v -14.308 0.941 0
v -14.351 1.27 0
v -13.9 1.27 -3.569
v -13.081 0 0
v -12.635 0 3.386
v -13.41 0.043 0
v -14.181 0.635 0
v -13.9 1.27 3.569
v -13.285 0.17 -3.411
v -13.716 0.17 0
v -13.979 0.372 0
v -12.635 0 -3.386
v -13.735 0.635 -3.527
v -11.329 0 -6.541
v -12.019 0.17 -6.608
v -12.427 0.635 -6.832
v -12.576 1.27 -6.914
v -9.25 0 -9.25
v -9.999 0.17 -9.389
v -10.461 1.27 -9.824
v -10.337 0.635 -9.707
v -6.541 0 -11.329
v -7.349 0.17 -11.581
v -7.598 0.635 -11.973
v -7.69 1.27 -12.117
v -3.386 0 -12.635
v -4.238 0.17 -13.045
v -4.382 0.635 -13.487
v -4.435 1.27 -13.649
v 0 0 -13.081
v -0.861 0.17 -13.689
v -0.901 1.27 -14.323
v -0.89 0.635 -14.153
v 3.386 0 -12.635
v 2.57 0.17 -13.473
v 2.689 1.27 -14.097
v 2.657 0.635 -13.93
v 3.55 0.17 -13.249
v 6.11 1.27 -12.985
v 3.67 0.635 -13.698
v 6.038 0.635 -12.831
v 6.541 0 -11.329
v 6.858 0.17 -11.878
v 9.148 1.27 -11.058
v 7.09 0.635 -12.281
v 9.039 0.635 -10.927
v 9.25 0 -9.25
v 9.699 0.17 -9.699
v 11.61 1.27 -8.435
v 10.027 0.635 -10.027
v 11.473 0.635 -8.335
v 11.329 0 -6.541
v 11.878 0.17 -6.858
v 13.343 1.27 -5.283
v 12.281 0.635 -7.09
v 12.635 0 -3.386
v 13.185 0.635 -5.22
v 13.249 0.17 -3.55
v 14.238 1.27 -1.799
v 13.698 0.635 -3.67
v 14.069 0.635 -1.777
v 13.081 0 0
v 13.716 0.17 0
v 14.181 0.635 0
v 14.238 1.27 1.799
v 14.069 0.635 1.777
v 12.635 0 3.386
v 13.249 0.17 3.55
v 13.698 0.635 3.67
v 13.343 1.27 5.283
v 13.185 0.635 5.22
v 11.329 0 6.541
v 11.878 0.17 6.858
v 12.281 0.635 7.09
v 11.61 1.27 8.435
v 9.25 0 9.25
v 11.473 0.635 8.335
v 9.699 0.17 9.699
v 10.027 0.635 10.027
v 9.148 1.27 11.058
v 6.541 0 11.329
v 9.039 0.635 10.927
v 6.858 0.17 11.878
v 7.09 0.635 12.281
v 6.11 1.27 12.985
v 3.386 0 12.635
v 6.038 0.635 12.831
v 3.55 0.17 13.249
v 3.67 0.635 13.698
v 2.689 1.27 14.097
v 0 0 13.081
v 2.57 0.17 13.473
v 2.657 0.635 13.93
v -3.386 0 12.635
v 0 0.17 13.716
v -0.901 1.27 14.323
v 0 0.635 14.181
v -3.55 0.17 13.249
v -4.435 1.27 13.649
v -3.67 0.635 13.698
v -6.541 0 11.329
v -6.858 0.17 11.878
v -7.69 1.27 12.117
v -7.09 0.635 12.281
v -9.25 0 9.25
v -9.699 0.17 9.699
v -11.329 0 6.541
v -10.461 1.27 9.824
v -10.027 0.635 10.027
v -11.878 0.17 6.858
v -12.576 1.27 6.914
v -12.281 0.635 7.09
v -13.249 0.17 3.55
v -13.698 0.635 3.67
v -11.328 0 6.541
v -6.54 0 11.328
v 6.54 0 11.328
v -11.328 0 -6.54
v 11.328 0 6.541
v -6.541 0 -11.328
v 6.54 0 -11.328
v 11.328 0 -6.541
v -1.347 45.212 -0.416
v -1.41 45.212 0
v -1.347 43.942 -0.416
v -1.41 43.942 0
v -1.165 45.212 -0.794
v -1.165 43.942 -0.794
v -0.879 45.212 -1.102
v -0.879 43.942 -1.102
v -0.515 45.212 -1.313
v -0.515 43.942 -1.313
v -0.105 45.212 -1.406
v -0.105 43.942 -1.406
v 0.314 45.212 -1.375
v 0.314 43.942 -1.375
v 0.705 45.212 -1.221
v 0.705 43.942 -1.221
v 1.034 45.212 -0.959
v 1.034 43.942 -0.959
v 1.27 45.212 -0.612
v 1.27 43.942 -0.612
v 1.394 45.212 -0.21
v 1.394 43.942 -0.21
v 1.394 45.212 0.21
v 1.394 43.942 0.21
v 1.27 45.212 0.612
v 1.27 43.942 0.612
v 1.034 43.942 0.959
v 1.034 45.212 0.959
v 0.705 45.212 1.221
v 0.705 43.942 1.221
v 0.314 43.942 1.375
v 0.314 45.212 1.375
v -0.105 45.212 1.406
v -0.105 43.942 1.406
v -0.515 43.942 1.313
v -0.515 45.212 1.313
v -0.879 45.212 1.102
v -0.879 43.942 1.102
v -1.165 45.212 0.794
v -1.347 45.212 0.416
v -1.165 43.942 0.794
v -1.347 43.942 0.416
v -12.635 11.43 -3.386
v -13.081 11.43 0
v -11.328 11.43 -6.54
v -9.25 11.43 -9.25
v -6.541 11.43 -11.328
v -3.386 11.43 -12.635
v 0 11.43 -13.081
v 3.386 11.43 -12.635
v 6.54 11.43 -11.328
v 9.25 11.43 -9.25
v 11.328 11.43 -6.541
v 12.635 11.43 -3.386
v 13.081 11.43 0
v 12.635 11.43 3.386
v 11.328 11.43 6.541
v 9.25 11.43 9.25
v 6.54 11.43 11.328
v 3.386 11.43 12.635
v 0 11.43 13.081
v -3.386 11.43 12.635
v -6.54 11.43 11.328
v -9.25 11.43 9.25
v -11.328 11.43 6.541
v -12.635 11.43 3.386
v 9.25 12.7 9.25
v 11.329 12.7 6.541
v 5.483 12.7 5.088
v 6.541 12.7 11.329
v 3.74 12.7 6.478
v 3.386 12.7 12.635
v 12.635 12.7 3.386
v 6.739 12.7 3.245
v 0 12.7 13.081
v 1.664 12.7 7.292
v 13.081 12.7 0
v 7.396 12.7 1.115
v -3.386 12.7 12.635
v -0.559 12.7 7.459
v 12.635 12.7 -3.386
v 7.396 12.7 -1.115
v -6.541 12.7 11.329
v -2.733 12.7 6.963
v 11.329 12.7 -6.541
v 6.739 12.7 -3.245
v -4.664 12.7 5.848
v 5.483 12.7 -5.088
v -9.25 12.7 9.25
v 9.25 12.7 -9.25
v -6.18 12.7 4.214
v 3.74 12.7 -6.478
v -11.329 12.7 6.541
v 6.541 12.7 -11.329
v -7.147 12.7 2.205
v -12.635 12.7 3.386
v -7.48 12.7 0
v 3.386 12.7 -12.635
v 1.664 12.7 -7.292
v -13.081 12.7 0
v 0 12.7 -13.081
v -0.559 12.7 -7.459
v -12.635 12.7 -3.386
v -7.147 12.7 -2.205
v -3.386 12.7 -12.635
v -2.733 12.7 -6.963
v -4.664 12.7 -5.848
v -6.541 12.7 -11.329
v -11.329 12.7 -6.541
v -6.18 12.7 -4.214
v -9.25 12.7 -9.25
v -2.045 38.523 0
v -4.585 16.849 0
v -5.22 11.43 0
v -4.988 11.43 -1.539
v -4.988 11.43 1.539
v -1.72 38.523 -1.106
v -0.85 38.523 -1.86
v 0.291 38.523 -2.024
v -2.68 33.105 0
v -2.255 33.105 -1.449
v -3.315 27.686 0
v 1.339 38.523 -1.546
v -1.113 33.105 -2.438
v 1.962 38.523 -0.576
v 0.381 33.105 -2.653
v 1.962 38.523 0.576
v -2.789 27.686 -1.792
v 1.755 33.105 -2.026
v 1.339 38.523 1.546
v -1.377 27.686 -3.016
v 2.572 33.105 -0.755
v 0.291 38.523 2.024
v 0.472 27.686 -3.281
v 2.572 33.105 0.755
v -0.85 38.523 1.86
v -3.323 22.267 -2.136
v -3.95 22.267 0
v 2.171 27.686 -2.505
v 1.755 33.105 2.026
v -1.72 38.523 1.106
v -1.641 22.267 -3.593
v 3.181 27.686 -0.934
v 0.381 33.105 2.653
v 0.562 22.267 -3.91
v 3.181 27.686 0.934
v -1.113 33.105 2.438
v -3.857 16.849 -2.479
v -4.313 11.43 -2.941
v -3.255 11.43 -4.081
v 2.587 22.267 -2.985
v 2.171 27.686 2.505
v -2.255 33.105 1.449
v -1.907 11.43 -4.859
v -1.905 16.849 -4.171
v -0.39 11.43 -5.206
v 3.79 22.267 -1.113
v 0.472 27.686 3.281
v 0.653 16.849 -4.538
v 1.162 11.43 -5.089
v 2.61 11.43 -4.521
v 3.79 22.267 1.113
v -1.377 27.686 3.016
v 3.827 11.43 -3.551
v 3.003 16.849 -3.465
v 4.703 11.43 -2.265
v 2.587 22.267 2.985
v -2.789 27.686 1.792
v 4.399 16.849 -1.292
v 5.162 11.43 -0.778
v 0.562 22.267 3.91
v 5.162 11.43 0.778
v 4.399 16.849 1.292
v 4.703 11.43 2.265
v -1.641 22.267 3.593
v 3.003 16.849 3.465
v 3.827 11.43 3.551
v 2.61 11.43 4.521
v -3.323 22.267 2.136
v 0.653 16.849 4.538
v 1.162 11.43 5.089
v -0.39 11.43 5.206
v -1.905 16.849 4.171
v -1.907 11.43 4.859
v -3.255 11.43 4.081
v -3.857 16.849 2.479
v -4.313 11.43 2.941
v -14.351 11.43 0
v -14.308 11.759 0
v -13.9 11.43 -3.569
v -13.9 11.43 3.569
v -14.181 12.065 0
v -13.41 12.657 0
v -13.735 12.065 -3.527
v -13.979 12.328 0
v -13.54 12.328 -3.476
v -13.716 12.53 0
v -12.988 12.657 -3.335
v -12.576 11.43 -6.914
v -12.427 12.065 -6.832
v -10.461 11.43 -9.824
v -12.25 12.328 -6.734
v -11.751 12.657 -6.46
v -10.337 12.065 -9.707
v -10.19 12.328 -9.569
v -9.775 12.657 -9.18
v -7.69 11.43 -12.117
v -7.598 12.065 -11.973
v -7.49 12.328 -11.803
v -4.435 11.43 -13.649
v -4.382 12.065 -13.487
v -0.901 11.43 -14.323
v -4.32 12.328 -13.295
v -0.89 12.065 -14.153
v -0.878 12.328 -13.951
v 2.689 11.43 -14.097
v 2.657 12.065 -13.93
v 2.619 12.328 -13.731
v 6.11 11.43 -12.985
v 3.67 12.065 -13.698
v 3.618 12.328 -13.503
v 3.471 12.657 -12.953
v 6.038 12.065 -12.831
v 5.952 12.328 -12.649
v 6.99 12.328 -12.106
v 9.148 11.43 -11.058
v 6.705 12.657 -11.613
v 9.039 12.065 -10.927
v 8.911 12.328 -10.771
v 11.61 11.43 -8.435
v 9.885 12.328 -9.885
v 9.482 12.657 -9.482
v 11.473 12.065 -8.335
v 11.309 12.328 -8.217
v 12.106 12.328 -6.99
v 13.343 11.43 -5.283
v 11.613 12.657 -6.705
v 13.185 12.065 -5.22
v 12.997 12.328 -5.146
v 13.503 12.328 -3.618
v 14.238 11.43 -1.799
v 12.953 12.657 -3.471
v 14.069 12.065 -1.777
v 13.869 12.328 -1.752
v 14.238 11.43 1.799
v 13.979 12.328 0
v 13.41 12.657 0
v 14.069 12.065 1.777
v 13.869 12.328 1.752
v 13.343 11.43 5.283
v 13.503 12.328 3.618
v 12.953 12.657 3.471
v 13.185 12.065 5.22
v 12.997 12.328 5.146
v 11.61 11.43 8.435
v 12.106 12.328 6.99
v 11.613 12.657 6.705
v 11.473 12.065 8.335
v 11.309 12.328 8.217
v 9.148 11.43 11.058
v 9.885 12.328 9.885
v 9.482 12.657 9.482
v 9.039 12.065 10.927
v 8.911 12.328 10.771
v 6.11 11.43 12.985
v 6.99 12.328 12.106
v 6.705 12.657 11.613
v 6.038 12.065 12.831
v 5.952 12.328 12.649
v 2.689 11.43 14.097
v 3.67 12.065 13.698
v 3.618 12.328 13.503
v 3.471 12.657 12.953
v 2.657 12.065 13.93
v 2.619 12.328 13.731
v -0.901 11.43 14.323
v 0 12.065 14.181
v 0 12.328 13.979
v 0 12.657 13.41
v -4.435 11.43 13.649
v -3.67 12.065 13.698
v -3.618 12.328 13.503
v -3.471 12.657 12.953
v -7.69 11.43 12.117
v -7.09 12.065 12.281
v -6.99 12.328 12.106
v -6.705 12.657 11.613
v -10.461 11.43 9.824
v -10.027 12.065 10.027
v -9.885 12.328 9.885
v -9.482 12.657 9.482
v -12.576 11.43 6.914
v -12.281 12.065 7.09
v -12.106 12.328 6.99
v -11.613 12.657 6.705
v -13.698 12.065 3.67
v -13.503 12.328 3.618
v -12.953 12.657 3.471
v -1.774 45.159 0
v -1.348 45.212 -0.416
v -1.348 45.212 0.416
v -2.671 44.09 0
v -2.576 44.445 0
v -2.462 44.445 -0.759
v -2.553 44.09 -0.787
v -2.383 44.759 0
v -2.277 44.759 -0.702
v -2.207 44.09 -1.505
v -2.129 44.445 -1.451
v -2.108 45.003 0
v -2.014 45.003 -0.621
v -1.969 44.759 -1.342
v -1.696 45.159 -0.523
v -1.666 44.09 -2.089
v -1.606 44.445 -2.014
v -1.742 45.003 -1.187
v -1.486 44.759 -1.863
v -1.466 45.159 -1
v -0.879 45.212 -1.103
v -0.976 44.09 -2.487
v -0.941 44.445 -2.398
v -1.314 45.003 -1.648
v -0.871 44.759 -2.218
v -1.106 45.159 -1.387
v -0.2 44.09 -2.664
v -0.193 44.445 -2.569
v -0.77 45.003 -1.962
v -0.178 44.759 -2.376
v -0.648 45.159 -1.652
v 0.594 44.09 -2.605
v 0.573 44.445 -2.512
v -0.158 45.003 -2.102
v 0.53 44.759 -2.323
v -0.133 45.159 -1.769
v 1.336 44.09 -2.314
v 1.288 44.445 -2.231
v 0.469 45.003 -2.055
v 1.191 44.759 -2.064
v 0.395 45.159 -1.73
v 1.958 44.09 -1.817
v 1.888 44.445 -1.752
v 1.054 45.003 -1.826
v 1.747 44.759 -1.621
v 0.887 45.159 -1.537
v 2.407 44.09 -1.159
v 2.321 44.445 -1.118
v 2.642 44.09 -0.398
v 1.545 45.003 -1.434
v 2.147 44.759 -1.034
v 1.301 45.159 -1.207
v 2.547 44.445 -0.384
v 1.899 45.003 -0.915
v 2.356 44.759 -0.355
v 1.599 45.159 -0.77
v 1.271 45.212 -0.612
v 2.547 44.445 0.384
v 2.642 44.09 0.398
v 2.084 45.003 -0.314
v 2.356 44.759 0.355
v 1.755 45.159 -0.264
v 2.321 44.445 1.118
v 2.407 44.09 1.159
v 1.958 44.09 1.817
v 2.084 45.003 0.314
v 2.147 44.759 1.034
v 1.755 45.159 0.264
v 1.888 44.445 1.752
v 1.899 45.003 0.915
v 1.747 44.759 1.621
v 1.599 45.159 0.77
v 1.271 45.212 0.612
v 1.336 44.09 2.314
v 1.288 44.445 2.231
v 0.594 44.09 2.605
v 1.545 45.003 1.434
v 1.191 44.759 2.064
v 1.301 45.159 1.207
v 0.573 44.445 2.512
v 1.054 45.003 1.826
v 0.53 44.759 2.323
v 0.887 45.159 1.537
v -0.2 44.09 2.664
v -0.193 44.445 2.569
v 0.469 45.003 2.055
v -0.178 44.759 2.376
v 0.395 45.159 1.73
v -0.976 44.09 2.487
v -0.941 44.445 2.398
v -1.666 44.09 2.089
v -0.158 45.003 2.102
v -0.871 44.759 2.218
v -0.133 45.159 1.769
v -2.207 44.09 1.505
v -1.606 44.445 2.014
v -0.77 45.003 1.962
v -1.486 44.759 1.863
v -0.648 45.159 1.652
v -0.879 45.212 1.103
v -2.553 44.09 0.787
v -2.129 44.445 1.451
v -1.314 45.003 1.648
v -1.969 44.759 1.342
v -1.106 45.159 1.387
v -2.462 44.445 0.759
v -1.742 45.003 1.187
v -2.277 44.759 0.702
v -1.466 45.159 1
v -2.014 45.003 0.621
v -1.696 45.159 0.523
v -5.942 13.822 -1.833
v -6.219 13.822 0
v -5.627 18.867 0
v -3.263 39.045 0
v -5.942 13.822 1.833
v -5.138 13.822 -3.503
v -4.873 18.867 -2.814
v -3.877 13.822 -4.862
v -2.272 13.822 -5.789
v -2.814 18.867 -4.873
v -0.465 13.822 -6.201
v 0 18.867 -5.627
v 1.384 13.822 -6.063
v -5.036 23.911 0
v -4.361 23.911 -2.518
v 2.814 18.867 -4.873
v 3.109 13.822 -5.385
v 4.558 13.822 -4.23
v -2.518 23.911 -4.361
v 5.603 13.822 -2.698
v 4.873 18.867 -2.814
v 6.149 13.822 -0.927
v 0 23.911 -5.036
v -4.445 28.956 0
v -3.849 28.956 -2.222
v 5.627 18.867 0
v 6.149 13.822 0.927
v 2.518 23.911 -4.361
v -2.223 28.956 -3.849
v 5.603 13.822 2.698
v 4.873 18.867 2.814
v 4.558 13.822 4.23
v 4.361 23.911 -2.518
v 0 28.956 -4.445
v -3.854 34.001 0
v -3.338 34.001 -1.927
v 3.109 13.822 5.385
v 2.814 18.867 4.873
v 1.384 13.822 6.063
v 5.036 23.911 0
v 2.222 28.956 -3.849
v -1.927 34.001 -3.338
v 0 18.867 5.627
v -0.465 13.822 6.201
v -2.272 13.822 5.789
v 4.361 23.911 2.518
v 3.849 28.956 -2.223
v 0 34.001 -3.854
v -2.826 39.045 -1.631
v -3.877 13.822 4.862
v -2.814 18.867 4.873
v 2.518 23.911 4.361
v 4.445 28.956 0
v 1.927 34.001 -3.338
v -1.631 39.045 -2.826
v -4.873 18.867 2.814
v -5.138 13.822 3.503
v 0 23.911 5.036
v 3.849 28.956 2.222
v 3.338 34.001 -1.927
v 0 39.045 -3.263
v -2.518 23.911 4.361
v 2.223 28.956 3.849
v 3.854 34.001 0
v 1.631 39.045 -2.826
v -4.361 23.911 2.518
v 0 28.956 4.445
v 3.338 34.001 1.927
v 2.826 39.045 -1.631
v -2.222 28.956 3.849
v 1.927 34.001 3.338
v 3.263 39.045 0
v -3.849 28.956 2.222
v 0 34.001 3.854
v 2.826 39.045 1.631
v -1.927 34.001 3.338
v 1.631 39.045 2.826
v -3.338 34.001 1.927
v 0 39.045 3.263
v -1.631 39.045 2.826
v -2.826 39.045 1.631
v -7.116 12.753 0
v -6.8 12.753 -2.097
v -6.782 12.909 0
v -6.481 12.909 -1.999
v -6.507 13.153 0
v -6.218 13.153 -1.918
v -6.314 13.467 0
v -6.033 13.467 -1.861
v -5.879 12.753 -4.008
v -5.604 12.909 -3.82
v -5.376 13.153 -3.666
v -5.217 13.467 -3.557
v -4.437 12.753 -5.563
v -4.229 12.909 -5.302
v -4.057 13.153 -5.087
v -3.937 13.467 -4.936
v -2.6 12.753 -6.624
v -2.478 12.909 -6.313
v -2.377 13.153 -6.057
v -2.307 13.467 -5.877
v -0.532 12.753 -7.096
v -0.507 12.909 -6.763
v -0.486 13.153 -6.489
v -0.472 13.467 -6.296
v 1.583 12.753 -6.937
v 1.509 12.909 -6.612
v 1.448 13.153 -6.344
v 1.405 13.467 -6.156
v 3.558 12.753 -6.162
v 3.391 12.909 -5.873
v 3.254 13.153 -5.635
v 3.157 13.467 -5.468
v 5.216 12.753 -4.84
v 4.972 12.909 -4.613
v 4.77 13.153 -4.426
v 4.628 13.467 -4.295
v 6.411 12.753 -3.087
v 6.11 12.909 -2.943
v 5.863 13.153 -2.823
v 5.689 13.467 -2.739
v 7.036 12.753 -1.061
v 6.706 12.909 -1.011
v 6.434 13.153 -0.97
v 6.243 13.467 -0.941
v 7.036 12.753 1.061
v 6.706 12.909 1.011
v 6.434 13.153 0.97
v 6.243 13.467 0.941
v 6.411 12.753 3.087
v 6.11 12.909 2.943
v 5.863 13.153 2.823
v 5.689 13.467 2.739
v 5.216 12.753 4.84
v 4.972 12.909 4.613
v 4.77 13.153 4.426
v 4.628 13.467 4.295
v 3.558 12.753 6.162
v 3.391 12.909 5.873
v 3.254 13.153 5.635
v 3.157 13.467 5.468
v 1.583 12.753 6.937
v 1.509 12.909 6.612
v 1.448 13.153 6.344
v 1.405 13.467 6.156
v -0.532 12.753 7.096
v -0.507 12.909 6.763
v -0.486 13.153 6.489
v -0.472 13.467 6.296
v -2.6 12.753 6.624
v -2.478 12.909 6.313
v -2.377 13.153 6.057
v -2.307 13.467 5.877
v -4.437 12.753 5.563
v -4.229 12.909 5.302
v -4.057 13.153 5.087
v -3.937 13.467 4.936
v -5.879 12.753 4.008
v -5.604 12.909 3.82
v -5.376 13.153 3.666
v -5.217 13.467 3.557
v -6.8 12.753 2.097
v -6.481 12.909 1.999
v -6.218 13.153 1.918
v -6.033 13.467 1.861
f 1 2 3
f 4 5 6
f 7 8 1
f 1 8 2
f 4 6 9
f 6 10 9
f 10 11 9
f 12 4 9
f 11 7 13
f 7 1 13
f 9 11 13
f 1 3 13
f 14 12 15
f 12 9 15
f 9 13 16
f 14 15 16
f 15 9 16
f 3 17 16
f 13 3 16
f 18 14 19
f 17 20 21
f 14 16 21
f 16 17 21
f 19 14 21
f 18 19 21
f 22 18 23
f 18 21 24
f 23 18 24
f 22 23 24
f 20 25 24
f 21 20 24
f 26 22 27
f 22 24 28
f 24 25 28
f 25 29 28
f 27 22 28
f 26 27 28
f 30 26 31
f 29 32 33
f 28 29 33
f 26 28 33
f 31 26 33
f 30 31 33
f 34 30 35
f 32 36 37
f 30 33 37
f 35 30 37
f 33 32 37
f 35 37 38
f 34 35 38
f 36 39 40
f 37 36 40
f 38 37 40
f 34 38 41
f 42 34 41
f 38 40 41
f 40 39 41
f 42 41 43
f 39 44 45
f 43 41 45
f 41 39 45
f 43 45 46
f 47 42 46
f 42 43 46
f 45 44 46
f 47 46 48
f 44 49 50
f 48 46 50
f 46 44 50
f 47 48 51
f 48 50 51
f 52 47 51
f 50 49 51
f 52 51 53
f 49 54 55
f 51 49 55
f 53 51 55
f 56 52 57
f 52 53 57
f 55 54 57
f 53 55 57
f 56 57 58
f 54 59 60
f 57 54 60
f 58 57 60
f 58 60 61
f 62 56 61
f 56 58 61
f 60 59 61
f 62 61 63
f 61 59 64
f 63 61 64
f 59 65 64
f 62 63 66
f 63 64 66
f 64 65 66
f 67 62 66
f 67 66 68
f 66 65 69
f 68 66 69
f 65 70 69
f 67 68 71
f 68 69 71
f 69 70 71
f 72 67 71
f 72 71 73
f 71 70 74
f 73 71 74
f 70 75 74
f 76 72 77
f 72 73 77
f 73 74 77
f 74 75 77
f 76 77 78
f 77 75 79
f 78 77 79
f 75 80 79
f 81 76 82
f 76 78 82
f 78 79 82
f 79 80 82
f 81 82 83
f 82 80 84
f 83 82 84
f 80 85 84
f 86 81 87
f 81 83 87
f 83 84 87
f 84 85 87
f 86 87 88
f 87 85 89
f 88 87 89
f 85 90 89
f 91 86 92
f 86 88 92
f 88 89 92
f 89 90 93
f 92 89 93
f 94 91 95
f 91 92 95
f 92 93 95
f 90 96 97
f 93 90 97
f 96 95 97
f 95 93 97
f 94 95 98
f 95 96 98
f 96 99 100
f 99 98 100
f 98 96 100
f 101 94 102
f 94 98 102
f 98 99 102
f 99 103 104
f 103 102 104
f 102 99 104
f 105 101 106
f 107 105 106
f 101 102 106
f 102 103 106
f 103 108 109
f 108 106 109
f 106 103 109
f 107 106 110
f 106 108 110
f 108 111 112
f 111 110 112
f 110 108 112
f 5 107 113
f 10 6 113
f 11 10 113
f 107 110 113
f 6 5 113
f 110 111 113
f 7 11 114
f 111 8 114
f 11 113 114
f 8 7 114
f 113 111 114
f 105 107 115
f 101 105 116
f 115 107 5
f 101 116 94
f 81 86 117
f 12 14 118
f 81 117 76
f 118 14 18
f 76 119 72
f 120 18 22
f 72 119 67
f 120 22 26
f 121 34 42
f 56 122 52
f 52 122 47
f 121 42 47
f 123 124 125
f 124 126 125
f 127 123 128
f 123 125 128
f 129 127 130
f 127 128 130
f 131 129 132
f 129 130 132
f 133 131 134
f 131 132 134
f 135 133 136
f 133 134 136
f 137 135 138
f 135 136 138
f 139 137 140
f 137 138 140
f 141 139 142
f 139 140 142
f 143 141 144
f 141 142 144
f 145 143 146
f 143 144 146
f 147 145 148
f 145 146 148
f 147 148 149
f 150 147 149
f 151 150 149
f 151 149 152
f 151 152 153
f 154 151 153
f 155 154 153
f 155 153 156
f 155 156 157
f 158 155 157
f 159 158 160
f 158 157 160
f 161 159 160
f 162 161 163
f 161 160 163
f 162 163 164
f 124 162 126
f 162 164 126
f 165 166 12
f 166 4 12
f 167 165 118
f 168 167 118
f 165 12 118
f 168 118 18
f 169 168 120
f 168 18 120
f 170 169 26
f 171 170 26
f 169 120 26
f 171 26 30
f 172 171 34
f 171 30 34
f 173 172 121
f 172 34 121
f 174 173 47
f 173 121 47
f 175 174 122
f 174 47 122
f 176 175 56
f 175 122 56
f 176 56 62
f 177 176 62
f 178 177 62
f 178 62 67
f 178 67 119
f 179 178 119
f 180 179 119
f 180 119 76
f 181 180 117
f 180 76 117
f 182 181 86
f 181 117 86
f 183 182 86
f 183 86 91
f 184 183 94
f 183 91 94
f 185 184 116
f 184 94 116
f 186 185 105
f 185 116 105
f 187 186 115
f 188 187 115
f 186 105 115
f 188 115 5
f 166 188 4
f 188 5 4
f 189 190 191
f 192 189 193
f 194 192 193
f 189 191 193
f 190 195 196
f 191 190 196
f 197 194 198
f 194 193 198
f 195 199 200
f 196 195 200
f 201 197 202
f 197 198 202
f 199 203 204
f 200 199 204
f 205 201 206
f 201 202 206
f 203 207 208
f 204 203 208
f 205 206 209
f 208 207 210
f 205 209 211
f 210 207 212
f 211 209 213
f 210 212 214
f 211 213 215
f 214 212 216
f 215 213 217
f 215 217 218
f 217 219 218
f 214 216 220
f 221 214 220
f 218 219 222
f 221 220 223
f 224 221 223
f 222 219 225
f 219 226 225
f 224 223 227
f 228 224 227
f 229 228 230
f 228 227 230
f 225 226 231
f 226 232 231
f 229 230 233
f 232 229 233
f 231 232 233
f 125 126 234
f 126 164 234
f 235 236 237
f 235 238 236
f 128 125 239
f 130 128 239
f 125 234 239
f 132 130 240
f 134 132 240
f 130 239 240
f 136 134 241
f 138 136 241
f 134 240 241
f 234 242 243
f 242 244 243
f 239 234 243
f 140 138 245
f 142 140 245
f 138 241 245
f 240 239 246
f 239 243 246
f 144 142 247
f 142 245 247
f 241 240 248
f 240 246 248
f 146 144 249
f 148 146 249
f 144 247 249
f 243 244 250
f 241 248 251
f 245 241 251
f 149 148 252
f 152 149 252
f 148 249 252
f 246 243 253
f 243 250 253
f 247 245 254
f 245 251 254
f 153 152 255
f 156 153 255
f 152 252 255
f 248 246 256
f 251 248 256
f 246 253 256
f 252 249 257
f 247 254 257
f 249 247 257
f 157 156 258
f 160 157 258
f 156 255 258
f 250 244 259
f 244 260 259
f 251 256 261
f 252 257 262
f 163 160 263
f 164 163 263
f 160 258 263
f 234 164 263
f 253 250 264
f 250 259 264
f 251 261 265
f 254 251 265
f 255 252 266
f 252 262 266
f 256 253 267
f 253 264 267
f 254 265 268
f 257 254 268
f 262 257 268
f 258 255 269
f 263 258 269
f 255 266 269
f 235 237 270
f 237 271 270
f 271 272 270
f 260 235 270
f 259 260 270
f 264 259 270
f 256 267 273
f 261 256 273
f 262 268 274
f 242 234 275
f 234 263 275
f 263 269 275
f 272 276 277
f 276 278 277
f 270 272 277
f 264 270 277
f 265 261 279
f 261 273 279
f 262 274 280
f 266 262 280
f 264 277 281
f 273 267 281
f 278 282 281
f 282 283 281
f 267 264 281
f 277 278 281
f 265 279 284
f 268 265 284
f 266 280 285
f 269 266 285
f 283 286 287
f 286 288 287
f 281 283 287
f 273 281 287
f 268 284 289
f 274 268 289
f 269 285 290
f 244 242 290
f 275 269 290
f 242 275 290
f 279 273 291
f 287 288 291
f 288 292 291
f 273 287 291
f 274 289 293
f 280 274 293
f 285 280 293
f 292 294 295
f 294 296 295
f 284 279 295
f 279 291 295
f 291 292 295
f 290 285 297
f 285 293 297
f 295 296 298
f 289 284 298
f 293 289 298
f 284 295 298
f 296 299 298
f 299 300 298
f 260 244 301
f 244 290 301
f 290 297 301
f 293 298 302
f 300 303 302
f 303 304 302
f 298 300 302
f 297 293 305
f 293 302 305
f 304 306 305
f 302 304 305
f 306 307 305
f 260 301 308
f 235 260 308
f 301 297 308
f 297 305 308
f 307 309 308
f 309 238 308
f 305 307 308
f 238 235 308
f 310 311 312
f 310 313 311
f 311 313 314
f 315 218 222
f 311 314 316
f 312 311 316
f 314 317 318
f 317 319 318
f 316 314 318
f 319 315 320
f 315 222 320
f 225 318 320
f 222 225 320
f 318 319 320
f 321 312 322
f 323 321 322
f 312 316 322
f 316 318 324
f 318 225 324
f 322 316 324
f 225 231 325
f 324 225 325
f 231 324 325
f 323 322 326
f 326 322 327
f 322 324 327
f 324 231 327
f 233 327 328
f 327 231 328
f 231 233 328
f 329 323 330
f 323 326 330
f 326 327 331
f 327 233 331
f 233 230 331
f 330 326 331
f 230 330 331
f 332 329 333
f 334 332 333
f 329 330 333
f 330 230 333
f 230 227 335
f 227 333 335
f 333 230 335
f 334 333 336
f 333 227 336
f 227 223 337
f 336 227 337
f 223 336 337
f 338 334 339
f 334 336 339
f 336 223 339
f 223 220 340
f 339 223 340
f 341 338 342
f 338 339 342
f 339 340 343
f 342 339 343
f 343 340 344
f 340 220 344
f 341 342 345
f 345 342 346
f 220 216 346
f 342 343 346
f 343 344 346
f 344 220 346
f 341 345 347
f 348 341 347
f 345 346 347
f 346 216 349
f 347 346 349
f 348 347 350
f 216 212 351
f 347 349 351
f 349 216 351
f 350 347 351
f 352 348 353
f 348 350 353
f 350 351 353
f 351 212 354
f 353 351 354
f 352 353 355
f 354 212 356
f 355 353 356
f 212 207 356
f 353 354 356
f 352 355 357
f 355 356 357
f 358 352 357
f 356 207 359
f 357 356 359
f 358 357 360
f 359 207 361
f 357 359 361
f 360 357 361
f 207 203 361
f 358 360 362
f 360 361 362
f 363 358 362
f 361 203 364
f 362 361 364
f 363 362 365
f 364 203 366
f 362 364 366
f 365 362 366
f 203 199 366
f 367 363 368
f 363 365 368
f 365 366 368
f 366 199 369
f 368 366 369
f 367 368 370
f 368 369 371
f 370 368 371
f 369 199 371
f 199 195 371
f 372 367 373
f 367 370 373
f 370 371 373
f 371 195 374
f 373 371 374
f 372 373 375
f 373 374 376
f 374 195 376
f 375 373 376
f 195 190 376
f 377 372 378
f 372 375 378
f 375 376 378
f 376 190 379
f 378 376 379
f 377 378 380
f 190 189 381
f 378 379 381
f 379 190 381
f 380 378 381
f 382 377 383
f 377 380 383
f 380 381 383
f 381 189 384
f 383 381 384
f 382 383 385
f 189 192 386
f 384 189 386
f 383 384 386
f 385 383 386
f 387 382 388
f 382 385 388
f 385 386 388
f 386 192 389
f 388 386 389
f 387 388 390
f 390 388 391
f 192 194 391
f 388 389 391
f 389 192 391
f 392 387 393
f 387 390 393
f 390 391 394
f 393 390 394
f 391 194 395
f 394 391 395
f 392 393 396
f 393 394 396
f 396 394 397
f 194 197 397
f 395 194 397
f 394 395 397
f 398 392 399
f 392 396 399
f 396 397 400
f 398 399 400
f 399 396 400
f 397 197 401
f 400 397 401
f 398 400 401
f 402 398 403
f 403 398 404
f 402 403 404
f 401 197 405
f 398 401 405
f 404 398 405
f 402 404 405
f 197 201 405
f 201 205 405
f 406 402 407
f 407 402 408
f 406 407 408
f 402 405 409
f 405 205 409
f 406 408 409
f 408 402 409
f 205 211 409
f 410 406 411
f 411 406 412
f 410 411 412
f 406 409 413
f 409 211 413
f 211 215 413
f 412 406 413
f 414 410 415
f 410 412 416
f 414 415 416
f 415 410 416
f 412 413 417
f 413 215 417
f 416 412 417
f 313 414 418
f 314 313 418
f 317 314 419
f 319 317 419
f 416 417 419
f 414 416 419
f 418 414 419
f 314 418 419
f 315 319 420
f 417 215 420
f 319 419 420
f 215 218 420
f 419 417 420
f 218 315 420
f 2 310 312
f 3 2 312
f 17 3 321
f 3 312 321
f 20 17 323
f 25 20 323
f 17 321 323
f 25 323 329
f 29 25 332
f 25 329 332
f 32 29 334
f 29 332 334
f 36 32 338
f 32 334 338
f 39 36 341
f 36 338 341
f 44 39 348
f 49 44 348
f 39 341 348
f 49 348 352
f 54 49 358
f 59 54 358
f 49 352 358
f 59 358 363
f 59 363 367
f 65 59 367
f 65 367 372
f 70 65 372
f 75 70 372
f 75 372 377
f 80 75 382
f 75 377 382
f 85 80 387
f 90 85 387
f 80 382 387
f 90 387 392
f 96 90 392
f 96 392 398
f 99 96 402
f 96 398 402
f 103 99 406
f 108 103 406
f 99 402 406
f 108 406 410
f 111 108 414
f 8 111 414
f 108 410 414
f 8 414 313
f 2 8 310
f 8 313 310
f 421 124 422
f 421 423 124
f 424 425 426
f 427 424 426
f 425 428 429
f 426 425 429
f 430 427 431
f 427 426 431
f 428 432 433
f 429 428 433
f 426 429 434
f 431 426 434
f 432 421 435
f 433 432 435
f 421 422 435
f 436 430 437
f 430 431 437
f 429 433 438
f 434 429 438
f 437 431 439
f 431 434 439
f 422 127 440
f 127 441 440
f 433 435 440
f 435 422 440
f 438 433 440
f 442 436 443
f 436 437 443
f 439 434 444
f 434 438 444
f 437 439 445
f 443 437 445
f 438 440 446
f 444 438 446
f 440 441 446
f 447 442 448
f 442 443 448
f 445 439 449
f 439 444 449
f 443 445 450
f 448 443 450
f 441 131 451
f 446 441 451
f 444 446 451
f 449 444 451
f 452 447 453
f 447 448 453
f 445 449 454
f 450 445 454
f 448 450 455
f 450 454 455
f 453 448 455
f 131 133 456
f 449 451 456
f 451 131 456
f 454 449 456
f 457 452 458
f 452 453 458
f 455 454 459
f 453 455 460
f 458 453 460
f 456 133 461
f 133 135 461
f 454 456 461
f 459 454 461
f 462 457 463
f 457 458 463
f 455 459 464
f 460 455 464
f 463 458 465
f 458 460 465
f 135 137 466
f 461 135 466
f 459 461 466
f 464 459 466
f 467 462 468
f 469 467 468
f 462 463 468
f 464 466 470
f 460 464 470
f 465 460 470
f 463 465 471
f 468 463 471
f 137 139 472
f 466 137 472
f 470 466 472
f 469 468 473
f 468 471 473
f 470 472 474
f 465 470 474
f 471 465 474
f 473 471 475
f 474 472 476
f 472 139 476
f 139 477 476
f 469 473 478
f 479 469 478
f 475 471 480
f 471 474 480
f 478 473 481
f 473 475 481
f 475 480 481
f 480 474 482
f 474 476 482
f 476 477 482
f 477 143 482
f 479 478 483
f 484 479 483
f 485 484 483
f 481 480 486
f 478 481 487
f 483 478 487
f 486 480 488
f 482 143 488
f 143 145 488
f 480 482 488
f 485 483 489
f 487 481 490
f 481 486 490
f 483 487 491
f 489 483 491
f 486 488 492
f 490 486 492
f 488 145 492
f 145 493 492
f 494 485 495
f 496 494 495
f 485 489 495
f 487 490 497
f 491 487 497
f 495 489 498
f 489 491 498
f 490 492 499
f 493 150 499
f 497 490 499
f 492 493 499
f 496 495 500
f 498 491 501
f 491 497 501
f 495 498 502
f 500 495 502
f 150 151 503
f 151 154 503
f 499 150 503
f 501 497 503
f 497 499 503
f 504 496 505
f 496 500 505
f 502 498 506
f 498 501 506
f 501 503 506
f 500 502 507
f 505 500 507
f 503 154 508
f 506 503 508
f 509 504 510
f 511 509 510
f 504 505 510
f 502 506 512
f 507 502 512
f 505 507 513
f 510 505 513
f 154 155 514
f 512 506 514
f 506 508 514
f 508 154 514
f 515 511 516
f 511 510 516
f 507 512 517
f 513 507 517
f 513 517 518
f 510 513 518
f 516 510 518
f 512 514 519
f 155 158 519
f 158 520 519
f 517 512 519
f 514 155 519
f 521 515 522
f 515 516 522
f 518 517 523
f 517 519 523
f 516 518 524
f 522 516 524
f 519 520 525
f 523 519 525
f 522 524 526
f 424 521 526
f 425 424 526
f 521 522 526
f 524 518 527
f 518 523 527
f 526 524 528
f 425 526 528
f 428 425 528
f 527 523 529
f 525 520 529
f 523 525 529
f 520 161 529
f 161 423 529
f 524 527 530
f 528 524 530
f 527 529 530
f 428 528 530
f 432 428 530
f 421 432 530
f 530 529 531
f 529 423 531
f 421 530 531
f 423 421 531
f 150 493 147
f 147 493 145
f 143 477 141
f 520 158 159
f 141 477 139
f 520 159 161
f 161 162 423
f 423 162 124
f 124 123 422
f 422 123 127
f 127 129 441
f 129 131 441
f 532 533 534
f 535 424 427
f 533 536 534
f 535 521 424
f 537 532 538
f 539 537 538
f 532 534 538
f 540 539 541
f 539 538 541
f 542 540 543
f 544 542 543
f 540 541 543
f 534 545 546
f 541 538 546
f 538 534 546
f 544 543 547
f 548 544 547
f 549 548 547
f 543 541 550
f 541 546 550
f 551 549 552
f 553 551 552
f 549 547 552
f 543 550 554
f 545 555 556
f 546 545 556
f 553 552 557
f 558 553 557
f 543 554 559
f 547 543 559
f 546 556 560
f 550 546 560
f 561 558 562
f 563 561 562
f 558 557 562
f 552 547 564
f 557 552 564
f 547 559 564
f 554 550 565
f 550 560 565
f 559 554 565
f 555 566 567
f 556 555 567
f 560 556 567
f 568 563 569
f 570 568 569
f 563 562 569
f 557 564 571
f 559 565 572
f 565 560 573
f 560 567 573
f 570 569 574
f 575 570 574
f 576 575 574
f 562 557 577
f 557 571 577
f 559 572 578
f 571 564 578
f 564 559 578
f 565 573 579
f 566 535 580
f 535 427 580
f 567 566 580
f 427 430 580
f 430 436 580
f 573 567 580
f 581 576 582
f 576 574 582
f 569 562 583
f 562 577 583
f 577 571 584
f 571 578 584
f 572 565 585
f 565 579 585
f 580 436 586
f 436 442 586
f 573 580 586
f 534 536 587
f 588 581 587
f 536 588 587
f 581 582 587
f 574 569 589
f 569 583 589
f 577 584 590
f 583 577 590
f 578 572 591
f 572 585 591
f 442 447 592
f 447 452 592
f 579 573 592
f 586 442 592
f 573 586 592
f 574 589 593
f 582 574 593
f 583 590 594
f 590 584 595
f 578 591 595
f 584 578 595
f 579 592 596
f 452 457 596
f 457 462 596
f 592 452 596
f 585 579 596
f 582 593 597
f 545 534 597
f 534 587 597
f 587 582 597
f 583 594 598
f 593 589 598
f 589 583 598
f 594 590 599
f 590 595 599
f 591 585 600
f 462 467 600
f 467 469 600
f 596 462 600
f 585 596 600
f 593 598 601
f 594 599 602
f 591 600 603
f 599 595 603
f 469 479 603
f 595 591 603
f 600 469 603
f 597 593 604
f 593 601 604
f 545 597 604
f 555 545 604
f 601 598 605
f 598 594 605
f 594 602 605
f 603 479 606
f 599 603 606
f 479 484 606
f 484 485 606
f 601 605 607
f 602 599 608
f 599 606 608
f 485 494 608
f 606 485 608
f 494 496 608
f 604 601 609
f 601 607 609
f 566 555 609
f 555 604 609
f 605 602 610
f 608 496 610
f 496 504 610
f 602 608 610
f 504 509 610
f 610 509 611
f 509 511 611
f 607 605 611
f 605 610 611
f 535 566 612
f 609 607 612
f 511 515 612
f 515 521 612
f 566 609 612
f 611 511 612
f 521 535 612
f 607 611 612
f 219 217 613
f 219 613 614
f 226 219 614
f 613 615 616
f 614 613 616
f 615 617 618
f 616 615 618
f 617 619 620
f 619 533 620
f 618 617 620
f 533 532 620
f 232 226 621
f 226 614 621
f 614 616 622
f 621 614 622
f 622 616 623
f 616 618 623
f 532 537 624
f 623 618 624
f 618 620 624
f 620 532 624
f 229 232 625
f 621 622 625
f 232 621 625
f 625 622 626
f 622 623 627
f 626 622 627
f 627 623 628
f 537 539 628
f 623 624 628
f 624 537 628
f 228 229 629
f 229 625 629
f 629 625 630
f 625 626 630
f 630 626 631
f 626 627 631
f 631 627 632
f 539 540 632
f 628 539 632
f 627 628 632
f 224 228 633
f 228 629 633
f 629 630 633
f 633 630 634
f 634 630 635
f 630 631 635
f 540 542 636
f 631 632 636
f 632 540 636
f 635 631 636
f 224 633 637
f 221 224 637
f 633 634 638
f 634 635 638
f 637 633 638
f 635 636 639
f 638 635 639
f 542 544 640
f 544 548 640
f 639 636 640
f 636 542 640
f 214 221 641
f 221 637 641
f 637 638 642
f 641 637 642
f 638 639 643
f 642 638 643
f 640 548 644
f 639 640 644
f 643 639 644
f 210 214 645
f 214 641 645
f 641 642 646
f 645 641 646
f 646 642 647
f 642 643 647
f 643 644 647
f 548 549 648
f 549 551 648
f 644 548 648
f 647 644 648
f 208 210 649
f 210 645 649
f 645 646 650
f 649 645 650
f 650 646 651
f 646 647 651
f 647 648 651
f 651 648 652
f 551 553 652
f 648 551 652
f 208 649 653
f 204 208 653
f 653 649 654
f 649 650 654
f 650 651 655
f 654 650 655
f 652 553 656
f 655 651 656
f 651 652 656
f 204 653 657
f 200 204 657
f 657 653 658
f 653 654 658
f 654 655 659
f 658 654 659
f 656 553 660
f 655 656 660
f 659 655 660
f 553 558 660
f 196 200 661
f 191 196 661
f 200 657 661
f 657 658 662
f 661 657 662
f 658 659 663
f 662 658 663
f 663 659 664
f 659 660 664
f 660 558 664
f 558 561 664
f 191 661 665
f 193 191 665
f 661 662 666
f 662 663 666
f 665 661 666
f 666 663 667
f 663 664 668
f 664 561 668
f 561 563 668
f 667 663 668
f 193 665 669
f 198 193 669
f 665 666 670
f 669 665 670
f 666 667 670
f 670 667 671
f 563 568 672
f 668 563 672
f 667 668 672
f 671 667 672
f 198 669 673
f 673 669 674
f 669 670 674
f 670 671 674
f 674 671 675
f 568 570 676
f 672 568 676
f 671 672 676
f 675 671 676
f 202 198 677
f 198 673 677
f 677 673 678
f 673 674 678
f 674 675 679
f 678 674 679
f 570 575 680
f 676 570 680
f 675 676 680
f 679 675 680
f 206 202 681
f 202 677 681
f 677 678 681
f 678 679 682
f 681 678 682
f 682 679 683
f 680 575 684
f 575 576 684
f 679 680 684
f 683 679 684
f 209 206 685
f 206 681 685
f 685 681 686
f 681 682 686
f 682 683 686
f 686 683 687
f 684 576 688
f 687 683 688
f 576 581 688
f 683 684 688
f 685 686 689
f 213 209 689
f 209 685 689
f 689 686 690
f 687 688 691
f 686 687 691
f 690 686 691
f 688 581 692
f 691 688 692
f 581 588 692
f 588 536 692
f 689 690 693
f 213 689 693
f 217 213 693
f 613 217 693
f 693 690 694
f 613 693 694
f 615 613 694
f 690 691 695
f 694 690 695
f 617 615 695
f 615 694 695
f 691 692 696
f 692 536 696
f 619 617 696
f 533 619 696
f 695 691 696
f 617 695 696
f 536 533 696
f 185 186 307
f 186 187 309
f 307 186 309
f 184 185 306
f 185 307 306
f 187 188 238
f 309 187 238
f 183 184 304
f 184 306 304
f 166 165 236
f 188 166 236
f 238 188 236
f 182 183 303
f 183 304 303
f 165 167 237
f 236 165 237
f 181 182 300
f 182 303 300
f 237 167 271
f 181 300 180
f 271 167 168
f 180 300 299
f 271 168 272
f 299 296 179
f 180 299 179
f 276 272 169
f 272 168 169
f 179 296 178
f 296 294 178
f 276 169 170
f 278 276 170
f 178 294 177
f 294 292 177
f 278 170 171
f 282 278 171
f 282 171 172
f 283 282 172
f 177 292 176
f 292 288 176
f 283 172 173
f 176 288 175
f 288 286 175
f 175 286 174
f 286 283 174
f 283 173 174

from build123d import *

# Parameters (mm, degrees)
FILLET1_R = 1.27


with BuildPart() as part:
    # Sketch1 → Revolve1 (revolve)
    with BuildSketch(Plane.XY, mode=Mode.PRIVATE) as revolve1_sk:
        Polygon((13.081, 0), (14.351, 0), (14.351, 12.7), (6.35, 12.7), (2.54, 45.212), (1.410137462, 45.212), (1.410137462, 43.942), (5.220137462, 11.43), (13.081, 11.43), (13.081, 1.27), align=None)
    revolve(revolve1_sk.sketch.rotate(Axis((0, 43.942, 0), (0, -1, 0)), 180), axis=Axis((0, 43.942, 0), (0, -1, 0)))

    # Fillet1
    fillet1_edges = [part.edges().sort_by_distance(p)[0] for p in [
        (2.54, 45.212, 0),
        (6.35, 12.7, 0),
        (14.351, 12.7, 0),
        (14.351, 0, 0),
    ]]
    fillet(fillet1_edges, radius=FILLET1_R - 0.0001)  # a hair under: the kernel refuses the full size


solid = part.part
